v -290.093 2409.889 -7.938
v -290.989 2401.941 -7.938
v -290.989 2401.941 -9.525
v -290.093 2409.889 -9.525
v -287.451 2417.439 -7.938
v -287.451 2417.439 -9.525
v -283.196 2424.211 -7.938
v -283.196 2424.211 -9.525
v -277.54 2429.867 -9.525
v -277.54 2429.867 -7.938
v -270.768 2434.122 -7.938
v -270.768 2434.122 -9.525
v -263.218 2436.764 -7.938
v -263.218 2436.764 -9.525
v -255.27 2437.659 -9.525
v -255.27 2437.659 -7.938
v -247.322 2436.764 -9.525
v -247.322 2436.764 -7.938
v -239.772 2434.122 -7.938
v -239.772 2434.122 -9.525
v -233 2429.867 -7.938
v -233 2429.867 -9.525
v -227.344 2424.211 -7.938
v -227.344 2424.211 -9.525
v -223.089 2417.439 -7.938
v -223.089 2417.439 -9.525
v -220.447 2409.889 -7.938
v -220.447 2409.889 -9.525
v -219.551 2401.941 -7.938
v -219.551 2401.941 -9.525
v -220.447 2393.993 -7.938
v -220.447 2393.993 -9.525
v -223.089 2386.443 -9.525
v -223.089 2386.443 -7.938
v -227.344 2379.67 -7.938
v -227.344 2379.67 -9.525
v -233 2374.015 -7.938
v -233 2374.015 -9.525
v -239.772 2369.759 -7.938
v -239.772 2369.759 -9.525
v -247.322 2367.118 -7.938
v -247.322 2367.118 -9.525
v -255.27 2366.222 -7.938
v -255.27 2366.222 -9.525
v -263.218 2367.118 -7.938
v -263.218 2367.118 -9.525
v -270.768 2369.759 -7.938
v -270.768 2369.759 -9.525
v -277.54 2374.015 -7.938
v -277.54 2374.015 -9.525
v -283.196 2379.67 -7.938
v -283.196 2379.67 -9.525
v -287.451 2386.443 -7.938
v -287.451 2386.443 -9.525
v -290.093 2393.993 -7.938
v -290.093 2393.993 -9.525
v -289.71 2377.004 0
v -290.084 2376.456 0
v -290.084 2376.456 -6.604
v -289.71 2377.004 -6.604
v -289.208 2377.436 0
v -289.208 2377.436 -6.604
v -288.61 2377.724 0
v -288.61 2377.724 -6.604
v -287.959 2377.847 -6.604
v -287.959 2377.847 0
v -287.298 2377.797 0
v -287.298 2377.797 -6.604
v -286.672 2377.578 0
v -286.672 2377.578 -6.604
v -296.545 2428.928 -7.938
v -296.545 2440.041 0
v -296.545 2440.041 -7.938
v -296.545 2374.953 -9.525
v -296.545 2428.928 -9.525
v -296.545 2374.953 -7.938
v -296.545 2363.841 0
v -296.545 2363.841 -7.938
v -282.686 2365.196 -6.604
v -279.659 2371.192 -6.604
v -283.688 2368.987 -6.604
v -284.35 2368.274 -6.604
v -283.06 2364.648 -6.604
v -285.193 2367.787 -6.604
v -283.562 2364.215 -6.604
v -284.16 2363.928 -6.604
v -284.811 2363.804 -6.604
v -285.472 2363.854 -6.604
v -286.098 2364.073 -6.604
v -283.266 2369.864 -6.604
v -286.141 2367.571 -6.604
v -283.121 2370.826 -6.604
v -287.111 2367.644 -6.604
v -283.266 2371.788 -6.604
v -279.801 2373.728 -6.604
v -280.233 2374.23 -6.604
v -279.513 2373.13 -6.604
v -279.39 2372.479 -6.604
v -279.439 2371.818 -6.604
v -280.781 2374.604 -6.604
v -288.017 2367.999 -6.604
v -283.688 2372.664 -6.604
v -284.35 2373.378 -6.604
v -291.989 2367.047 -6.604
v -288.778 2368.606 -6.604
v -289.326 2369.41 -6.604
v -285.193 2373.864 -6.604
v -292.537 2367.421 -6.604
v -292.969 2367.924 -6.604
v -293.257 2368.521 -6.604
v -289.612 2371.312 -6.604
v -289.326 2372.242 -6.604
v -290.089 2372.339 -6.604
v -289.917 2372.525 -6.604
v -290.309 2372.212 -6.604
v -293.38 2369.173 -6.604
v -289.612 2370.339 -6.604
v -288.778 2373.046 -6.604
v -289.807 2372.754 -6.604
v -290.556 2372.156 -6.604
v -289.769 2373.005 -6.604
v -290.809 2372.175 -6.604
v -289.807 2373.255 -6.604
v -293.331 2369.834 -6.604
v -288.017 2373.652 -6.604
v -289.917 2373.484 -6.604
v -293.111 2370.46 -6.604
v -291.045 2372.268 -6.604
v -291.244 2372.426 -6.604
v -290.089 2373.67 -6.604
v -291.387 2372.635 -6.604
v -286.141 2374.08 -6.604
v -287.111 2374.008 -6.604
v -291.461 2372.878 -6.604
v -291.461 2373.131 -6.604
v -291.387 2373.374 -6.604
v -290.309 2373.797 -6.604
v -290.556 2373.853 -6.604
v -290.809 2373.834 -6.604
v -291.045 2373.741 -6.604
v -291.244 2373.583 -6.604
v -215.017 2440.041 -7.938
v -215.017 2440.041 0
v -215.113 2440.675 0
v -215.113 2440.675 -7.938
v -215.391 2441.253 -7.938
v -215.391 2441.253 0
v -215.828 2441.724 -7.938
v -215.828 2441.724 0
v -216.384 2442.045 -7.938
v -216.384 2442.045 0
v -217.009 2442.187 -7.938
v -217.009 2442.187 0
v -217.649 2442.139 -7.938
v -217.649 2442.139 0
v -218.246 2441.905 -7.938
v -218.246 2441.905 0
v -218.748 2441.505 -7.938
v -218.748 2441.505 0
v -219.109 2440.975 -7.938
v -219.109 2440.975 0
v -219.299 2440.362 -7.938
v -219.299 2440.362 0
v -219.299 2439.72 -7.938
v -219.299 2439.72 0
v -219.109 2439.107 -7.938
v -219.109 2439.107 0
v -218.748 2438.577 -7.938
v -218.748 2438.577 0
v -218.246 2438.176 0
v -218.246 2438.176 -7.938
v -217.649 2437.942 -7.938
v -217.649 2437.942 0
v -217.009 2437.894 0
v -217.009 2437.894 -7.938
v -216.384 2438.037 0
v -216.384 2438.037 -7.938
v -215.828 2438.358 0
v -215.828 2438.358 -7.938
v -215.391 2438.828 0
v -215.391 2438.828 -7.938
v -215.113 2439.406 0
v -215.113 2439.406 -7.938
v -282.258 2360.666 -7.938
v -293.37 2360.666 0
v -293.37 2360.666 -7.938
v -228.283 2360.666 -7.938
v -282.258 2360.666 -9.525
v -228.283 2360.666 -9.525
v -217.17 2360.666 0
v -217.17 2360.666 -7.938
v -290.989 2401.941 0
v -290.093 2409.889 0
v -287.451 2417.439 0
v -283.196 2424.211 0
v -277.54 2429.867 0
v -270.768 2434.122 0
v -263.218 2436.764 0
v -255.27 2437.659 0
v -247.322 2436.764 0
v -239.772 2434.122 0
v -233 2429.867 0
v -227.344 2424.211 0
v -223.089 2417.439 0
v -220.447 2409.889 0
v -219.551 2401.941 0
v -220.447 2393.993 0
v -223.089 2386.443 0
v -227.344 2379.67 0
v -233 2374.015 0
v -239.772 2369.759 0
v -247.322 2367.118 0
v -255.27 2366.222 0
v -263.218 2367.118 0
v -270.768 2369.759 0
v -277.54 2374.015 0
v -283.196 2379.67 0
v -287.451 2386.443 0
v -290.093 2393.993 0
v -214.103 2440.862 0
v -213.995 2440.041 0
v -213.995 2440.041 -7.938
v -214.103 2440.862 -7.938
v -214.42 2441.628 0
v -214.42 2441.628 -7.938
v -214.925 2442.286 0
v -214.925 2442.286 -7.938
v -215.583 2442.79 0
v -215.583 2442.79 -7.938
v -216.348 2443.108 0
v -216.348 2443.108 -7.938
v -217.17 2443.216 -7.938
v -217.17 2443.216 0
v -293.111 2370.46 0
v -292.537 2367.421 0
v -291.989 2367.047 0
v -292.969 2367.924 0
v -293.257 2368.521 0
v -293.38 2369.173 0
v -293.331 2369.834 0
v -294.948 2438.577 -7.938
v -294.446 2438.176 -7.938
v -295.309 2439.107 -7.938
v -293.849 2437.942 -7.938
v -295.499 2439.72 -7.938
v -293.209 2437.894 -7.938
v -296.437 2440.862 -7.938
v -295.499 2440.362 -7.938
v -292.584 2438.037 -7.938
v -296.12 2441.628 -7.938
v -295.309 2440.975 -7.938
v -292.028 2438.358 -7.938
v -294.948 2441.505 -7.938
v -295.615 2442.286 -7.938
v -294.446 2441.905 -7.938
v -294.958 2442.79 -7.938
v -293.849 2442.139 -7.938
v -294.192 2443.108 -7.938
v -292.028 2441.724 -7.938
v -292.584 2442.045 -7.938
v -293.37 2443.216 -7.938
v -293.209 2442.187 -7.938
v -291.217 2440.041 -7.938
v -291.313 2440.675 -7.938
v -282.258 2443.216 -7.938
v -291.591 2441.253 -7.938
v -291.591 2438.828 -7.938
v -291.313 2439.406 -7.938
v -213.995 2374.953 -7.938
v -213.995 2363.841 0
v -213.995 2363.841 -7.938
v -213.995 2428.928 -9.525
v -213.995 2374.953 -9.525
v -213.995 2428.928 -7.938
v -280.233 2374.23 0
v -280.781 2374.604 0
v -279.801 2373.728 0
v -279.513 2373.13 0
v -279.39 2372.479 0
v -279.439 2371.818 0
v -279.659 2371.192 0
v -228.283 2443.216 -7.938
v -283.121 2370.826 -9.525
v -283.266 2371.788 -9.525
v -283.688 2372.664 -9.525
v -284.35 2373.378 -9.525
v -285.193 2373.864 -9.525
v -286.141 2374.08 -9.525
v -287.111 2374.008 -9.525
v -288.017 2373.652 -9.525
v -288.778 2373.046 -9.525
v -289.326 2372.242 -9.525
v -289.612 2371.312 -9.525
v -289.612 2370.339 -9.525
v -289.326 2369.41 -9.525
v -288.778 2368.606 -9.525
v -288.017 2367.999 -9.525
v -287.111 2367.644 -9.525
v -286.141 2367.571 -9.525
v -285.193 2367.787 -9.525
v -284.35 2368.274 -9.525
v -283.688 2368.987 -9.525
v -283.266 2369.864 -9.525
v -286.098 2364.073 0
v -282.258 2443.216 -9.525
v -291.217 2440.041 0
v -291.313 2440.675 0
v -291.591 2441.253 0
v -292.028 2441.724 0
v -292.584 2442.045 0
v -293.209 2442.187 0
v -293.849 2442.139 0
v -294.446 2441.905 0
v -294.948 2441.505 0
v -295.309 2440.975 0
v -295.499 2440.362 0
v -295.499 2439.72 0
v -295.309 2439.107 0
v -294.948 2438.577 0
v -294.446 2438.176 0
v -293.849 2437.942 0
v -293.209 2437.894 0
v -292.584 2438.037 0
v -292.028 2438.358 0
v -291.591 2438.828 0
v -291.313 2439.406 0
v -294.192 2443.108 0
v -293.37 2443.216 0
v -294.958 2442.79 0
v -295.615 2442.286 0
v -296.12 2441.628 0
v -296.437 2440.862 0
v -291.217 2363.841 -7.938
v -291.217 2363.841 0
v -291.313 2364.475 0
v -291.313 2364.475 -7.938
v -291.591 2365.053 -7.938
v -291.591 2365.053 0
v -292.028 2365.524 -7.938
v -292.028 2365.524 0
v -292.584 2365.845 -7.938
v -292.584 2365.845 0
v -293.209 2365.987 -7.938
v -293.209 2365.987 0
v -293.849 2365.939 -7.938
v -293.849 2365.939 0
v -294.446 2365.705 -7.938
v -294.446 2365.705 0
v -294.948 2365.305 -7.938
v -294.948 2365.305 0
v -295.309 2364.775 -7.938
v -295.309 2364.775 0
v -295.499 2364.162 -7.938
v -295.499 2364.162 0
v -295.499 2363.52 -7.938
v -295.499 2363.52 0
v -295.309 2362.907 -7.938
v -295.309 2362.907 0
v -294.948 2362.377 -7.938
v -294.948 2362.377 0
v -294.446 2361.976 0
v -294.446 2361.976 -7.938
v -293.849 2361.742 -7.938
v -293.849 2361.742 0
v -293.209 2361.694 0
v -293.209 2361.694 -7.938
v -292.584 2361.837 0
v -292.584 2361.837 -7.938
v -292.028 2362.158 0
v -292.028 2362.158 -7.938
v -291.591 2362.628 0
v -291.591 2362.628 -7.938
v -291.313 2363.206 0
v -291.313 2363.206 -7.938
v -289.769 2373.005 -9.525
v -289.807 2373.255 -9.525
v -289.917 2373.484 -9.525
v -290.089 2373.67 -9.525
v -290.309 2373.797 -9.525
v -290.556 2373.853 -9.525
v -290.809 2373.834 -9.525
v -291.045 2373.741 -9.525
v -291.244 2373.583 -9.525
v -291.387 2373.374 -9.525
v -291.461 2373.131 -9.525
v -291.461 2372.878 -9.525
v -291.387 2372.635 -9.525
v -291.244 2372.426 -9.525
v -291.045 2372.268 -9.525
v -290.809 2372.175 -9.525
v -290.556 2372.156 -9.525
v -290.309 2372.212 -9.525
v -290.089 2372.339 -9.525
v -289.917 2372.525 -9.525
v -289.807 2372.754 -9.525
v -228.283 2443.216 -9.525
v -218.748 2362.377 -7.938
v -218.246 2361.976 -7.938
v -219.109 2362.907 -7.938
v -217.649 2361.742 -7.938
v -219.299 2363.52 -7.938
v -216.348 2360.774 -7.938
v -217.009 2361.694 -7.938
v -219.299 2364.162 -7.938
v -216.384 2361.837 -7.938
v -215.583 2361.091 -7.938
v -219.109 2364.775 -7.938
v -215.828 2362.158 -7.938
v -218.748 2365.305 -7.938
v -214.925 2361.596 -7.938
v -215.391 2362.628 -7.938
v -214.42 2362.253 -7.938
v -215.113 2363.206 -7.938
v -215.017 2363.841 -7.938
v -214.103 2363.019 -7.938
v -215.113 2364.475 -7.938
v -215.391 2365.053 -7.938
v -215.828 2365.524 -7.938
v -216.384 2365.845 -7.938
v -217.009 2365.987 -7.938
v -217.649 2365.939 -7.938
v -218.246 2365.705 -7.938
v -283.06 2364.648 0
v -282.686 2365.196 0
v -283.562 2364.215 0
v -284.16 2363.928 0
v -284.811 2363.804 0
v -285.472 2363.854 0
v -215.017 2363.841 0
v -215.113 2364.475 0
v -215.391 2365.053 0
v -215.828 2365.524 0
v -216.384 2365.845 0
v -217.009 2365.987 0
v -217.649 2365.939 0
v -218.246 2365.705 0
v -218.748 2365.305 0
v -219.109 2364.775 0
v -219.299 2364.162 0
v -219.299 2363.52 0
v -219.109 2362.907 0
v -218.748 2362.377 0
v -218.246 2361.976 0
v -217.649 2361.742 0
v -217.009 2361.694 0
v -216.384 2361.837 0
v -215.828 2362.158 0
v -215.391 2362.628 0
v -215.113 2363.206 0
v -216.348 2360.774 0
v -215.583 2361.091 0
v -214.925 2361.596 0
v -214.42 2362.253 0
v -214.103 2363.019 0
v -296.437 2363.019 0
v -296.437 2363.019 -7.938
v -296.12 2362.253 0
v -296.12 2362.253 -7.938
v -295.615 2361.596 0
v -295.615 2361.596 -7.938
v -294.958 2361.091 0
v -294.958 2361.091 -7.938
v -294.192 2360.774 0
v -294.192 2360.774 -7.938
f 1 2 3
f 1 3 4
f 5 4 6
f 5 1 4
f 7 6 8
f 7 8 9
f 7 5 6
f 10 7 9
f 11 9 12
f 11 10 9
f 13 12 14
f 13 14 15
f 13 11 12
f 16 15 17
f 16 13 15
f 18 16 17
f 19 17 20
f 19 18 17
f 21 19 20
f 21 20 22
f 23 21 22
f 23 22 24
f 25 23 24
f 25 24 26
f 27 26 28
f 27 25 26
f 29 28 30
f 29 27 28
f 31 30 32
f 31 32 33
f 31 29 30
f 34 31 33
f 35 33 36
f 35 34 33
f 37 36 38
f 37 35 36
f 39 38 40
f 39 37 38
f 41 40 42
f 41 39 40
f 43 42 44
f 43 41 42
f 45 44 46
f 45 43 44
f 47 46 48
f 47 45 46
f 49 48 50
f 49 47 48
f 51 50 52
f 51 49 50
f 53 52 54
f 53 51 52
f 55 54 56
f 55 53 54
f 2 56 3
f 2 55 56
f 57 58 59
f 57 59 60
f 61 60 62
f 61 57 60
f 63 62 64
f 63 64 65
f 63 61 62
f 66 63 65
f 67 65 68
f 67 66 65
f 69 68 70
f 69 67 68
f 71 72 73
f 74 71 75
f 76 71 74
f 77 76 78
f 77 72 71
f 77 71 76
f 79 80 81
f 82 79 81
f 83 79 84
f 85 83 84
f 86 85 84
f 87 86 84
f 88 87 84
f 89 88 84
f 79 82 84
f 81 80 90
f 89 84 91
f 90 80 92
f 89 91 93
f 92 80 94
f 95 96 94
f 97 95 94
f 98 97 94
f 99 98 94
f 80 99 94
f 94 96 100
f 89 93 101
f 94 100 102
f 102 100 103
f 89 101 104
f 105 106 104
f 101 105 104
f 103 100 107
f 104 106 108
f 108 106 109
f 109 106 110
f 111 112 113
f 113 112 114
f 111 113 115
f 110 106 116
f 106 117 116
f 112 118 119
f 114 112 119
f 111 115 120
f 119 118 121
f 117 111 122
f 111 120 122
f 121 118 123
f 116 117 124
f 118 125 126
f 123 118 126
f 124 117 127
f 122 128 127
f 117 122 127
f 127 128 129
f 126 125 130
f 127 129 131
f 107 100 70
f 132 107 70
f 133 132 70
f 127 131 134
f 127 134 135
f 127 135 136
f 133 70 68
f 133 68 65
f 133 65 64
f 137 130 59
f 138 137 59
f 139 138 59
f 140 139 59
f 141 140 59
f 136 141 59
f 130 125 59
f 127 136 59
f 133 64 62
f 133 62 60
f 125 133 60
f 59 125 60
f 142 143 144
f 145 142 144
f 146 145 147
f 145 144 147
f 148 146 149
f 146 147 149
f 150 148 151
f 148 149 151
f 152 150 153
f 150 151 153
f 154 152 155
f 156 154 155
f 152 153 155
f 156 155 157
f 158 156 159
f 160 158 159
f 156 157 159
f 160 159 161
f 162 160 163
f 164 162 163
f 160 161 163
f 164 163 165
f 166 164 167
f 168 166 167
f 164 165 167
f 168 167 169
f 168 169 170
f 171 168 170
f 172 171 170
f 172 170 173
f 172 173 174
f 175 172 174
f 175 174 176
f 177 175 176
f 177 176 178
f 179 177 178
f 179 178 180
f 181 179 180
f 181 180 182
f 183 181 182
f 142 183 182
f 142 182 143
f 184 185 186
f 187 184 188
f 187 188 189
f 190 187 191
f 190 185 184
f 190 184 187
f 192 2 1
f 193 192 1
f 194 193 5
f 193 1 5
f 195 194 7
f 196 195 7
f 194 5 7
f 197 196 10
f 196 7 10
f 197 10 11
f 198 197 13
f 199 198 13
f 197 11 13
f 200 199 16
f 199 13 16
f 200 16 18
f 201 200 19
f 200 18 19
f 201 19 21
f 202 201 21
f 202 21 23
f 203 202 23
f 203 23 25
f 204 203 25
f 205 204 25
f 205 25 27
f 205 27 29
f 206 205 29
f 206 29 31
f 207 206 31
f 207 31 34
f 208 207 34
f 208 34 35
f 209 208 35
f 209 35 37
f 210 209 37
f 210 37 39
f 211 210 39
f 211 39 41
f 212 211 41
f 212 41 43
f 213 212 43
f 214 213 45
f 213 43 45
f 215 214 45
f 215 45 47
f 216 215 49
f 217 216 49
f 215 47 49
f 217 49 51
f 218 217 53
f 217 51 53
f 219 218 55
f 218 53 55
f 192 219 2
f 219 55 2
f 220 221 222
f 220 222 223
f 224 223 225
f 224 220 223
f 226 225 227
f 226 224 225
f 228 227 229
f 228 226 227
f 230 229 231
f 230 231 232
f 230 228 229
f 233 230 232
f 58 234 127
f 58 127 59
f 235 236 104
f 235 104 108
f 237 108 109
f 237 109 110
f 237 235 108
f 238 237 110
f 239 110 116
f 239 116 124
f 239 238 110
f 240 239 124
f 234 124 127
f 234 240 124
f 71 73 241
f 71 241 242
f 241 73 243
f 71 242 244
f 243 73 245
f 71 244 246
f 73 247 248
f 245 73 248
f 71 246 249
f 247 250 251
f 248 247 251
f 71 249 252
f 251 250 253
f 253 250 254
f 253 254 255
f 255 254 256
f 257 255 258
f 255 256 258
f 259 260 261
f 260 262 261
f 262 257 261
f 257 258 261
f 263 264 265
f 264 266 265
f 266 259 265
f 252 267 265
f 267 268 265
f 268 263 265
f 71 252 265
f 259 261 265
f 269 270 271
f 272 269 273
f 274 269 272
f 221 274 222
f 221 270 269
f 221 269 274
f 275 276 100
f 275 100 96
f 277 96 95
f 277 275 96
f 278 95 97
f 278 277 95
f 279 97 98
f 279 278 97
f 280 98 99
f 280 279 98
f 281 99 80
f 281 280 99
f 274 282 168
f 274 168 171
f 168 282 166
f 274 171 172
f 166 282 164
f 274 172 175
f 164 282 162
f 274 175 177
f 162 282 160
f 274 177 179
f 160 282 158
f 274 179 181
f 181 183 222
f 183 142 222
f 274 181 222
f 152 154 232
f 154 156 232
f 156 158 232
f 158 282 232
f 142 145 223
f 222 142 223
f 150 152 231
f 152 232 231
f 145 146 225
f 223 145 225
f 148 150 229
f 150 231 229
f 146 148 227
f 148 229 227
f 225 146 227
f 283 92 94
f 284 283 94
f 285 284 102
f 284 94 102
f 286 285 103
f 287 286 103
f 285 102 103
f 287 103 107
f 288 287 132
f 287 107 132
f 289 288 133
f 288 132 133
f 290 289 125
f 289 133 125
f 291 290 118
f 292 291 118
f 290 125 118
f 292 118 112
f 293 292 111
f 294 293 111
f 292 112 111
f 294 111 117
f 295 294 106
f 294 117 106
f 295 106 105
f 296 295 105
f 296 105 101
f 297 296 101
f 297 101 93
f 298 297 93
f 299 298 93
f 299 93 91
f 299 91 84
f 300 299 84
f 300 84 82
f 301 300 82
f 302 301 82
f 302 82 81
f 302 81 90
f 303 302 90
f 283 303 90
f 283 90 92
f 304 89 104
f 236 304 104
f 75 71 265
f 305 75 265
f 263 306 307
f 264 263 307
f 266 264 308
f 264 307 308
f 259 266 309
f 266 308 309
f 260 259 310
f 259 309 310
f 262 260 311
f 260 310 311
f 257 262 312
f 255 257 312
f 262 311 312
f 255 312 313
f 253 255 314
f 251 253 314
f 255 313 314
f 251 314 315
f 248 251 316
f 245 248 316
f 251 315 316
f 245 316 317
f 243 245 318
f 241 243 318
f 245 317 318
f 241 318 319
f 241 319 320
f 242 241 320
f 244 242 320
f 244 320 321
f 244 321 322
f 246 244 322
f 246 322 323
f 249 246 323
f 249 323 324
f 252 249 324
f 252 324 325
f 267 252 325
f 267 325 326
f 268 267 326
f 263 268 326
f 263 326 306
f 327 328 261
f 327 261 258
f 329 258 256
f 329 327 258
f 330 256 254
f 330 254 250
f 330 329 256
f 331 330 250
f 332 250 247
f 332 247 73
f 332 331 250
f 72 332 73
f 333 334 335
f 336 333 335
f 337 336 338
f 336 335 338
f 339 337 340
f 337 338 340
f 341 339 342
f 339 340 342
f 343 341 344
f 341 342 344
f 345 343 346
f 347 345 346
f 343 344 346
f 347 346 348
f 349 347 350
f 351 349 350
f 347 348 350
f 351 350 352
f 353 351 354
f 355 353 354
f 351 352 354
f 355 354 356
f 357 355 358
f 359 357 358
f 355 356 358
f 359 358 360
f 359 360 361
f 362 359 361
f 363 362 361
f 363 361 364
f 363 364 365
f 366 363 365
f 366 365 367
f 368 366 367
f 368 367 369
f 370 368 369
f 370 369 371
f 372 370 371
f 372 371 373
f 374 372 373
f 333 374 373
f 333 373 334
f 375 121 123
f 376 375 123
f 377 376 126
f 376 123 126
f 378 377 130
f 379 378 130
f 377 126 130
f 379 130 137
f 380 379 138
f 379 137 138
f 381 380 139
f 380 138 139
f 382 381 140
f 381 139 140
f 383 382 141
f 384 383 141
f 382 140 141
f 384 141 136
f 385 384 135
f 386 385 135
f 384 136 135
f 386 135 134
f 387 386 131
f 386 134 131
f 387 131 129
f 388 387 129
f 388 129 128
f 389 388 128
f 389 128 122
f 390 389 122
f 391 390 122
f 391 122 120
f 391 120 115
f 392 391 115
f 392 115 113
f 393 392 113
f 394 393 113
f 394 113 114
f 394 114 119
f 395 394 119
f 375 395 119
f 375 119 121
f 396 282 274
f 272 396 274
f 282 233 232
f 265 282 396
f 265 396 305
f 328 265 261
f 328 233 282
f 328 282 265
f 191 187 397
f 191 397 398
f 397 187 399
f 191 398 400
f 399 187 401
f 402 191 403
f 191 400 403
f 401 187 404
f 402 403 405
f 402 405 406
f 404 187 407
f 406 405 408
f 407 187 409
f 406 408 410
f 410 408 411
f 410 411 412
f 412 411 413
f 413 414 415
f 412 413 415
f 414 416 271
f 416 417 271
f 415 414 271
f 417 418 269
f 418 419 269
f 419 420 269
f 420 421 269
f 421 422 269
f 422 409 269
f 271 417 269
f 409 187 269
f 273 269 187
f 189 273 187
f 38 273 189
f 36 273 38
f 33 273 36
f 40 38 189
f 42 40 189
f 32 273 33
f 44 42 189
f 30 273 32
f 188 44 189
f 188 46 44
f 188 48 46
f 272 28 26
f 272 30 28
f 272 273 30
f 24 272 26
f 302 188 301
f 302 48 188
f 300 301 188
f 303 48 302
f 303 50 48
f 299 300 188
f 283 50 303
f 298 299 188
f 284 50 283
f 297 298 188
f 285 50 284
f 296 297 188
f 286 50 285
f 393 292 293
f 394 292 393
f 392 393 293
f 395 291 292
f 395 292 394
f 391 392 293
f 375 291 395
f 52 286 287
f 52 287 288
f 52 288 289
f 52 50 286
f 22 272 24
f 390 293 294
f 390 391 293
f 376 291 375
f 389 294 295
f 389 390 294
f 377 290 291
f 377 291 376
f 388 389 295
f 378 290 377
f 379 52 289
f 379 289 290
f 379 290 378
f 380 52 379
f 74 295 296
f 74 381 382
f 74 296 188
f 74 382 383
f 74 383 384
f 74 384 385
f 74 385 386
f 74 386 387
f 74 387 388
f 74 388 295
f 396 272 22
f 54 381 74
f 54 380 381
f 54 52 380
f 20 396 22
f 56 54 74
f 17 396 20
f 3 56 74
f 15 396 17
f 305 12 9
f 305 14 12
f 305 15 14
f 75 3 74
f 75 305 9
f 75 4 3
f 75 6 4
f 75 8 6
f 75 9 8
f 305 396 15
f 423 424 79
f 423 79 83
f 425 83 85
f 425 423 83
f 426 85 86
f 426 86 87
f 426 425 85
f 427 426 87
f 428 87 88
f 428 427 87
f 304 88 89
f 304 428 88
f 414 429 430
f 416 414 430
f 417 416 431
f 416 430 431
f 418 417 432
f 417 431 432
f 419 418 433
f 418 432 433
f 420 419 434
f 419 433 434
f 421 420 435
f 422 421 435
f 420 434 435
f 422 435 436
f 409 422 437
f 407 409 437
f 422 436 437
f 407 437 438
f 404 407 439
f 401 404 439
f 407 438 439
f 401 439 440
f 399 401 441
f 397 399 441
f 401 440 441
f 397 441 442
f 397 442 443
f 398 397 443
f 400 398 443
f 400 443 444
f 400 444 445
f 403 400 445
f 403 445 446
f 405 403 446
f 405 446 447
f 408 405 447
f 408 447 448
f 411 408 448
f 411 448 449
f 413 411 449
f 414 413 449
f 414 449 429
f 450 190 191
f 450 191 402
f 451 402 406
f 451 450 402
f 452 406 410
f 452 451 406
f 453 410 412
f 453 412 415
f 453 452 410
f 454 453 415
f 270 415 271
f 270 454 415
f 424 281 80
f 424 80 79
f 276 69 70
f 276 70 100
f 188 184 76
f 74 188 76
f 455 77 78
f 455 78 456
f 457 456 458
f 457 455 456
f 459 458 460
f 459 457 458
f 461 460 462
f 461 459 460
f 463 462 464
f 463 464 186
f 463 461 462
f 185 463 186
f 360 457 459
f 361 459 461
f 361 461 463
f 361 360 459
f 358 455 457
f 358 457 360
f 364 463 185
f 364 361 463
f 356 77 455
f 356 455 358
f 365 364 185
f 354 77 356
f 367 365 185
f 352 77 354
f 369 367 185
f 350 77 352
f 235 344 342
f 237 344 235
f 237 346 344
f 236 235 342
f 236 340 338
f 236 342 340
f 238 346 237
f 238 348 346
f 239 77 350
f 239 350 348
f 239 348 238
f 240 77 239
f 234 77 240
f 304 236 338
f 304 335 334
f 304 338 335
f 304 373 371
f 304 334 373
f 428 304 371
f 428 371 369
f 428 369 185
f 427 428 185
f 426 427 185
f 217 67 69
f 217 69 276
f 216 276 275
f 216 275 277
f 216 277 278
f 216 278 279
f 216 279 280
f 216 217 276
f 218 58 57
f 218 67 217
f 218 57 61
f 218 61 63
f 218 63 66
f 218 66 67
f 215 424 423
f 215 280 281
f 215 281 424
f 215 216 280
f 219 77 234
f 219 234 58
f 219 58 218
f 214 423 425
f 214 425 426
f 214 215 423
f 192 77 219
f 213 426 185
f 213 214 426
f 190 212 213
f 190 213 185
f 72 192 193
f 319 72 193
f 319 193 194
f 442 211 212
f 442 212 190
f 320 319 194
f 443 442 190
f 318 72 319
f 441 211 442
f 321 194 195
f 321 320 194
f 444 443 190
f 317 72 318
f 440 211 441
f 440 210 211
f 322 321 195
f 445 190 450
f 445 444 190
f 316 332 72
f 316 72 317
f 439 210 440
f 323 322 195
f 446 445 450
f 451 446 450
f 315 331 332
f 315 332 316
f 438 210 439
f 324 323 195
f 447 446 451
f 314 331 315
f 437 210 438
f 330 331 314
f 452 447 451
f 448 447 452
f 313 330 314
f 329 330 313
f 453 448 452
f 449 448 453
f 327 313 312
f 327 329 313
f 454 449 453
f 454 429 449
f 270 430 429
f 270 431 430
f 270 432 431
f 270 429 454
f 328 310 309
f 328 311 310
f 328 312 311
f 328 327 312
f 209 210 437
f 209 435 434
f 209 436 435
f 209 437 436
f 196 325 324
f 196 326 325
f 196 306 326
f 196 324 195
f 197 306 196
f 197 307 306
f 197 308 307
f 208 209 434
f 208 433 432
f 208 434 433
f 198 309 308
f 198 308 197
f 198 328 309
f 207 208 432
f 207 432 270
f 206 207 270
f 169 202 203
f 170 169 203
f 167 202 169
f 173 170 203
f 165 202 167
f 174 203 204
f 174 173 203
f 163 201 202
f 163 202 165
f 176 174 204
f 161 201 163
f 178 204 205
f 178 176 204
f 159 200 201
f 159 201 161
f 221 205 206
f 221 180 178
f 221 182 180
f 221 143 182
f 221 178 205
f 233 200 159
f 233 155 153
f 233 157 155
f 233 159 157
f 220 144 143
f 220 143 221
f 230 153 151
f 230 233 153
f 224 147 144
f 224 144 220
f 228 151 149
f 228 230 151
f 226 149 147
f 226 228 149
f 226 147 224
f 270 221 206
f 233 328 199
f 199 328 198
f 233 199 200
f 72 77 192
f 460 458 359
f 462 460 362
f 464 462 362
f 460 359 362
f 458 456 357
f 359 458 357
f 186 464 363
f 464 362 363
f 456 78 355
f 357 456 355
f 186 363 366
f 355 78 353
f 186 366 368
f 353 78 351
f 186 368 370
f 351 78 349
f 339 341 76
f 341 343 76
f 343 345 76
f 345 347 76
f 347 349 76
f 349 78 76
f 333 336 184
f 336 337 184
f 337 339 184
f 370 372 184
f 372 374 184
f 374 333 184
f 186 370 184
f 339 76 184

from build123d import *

# Parameters (mm, degrees)
BOSS_EXTRUDE1_DEPTH         = 7.9375
SKETCH2_R                   = 35.71875
BOSS_EXTRUDE2_DEPTH         = 1.5875
SKETCH3_R                   = 35.71875
CUT_EXTRUDE1_DEPTH          = 2.5875
CUT_EXTRUDE1_DEPTH_BACK     = 8.9375
F_6_CLEARANCE_HOLE1_D       = 4.3053
CUT_EXTRUDE2_DEPTH          = 6.604
F_0_257_DIAMETER_HOLE1_D    = 6.5278
F_51_0_067_DIAMETER_HOLE1_D = 1.7018


with BuildPart() as part:
    # Sketch1 → Boss-Extrude1 (new body)
    with BuildSketch(Plane.XY):
        with BuildLine():
            Line((-213.995000001, 2363.840725166), (-213.995000001, 2440.040725166))
            ThreePointArc((-213.995000001, 2440.040725166), (-214.92493597, 2442.285789196), (-217.170000001, 2443.215725166))
            Line((-217.170000001, 2443.215725166), (-293.370000001, 2443.215725166))
            ThreePointArc((-293.370000001, 2443.215725166), (-295.615064031, 2442.285789196), (-296.545000001, 2440.040725166))
            Line((-296.545000001, 2440.040725166), (-296.545000001, 2363.840725166))
            ThreePointArc((-296.545000001, 2363.840725166), (-295.615064031, 2361.595661136), (-293.370000001, 2360.665725166))
            Line((-293.370000001, 2360.665725166), (-217.170000001, 2360.665725166))
            ThreePointArc((-217.170000001, 2360.665725166), (-214.92493597, 2361.595661136), (-213.995000001, 2363.840725166))
        make_face()
    extrude(amount=-BOSS_EXTRUDE1_DEPTH)

    # Sketch2 → Boss-Extrude2 (add)
    with BuildSketch(Plane(origin=(0, 0, -7.9375), x_dir=(-1, 0, 0), z_dir=(0, 0, -1))):
        Polygon((282.257500001, 2360.665725166), (296.545000001, 2374.953225166), (296.545000001, 2428.928225166), (282.257500001, 2443.215725166), (228.282500001, 2443.215725166), (213.995000001, 2428.928225166), (213.995000001, 2374.953225166), (228.282500001, 2360.665725166), align=None)
        with Locations((255.270000001, 2401.940725166)):
            Circle(SKETCH2_R, mode=Mode.SUBTRACT)
    extrude(amount=BOSS_EXTRUDE2_DEPTH)

    # Sketch3 → Cut-Extrude1 (cut, two sides)
    with BuildSketch(Plane(origin=(0, 0, -7.9375), x_dir=(-1, 0, 0), z_dir=(0, 0, -1))) as cut_extrude1_sk:
        with Locations((255.270000001, 2401.940725166)):
            Circle(SKETCH3_R)
    extrude(amount=CUT_EXTRUDE1_DEPTH, mode=Mode.SUBTRACT)
    extrude(cut_extrude1_sk.sketch, amount=-CUT_EXTRUDE1_DEPTH_BACK, mode=Mode.SUBTRACT)

    # #6 Clearance Hole1 (through all)
    with Locations(Plane(origin=(0, 0, -7.9375), x_dir=(-1, 0, 0), z_dir=(0, 0, -1))):
        with Locations((217.170000001, 2440.040725166), (293.370000001, 2440.040725166), (293.370000001, 2363.840725166), (217.170000001, 2363.840725166)):
            Hole(F_6_CLEARANCE_HOLE1_D / 2)

    # Sketch6 → Cut-Extrude2 (cut)
    with BuildSketch(Plane.XY):
        with BuildLine():
            Line((-286.09833069, 2364.073109679), (-291.98898869, 2367.047457577))
            ThreePointArc((-291.98898869, 2367.047457577), (-293.256935443, 2368.521082635), (-293.111498919, 2370.459666654))
            Line((-293.111498919, 2370.459666654), (-290.083878389, 2376.455830423))
            ThreePointArc((-290.083878389, 2376.455830423), (-288.610253331, 2377.723777176), (-286.671669312, 2377.578340652))
            Line((-286.671669312, 2377.578340652), (-280.781011311, 2374.603992755))
            ThreePointArc((-280.781011311, 2374.603992755), (-279.513064558, 2373.130367697), (-279.658501082, 2371.191783678))
            Line((-279.658501082, 2371.191783678), (-282.686121613, 2365.195619909))
            ThreePointArc((-282.686121613, 2365.195619909), (-284.159746671, 2363.927673155), (-286.09833069, 2364.073109679))
        make_face()
    extrude(amount=-CUT_EXTRUDE2_DEPTH, mode=Mode.SUBTRACT)

    # F (0.257) Diameter Hole1 (through all)
    with Locations(Plane(origin=(0, 0, -9.525), x_dir=(-1, 0, 0), z_dir=(0, 0, -1))):
        with Locations((286.385000001, 2370.825725166)):
            Hole(F_0_257_DIAMETER_HOLE1_D / 2)

    # #51 (0.067) Diameter Hole1 (through all)
    with Locations(Plane(origin=(0, 0, -9.525), x_dir=(-1, 0, 0), z_dir=(0, 0, -1))):
        with Locations((290.619894526, 2373.004503404)):
            Hole(F_51_0_067_DIAMETER_HOLE1_D / 2)


solid = part.part
